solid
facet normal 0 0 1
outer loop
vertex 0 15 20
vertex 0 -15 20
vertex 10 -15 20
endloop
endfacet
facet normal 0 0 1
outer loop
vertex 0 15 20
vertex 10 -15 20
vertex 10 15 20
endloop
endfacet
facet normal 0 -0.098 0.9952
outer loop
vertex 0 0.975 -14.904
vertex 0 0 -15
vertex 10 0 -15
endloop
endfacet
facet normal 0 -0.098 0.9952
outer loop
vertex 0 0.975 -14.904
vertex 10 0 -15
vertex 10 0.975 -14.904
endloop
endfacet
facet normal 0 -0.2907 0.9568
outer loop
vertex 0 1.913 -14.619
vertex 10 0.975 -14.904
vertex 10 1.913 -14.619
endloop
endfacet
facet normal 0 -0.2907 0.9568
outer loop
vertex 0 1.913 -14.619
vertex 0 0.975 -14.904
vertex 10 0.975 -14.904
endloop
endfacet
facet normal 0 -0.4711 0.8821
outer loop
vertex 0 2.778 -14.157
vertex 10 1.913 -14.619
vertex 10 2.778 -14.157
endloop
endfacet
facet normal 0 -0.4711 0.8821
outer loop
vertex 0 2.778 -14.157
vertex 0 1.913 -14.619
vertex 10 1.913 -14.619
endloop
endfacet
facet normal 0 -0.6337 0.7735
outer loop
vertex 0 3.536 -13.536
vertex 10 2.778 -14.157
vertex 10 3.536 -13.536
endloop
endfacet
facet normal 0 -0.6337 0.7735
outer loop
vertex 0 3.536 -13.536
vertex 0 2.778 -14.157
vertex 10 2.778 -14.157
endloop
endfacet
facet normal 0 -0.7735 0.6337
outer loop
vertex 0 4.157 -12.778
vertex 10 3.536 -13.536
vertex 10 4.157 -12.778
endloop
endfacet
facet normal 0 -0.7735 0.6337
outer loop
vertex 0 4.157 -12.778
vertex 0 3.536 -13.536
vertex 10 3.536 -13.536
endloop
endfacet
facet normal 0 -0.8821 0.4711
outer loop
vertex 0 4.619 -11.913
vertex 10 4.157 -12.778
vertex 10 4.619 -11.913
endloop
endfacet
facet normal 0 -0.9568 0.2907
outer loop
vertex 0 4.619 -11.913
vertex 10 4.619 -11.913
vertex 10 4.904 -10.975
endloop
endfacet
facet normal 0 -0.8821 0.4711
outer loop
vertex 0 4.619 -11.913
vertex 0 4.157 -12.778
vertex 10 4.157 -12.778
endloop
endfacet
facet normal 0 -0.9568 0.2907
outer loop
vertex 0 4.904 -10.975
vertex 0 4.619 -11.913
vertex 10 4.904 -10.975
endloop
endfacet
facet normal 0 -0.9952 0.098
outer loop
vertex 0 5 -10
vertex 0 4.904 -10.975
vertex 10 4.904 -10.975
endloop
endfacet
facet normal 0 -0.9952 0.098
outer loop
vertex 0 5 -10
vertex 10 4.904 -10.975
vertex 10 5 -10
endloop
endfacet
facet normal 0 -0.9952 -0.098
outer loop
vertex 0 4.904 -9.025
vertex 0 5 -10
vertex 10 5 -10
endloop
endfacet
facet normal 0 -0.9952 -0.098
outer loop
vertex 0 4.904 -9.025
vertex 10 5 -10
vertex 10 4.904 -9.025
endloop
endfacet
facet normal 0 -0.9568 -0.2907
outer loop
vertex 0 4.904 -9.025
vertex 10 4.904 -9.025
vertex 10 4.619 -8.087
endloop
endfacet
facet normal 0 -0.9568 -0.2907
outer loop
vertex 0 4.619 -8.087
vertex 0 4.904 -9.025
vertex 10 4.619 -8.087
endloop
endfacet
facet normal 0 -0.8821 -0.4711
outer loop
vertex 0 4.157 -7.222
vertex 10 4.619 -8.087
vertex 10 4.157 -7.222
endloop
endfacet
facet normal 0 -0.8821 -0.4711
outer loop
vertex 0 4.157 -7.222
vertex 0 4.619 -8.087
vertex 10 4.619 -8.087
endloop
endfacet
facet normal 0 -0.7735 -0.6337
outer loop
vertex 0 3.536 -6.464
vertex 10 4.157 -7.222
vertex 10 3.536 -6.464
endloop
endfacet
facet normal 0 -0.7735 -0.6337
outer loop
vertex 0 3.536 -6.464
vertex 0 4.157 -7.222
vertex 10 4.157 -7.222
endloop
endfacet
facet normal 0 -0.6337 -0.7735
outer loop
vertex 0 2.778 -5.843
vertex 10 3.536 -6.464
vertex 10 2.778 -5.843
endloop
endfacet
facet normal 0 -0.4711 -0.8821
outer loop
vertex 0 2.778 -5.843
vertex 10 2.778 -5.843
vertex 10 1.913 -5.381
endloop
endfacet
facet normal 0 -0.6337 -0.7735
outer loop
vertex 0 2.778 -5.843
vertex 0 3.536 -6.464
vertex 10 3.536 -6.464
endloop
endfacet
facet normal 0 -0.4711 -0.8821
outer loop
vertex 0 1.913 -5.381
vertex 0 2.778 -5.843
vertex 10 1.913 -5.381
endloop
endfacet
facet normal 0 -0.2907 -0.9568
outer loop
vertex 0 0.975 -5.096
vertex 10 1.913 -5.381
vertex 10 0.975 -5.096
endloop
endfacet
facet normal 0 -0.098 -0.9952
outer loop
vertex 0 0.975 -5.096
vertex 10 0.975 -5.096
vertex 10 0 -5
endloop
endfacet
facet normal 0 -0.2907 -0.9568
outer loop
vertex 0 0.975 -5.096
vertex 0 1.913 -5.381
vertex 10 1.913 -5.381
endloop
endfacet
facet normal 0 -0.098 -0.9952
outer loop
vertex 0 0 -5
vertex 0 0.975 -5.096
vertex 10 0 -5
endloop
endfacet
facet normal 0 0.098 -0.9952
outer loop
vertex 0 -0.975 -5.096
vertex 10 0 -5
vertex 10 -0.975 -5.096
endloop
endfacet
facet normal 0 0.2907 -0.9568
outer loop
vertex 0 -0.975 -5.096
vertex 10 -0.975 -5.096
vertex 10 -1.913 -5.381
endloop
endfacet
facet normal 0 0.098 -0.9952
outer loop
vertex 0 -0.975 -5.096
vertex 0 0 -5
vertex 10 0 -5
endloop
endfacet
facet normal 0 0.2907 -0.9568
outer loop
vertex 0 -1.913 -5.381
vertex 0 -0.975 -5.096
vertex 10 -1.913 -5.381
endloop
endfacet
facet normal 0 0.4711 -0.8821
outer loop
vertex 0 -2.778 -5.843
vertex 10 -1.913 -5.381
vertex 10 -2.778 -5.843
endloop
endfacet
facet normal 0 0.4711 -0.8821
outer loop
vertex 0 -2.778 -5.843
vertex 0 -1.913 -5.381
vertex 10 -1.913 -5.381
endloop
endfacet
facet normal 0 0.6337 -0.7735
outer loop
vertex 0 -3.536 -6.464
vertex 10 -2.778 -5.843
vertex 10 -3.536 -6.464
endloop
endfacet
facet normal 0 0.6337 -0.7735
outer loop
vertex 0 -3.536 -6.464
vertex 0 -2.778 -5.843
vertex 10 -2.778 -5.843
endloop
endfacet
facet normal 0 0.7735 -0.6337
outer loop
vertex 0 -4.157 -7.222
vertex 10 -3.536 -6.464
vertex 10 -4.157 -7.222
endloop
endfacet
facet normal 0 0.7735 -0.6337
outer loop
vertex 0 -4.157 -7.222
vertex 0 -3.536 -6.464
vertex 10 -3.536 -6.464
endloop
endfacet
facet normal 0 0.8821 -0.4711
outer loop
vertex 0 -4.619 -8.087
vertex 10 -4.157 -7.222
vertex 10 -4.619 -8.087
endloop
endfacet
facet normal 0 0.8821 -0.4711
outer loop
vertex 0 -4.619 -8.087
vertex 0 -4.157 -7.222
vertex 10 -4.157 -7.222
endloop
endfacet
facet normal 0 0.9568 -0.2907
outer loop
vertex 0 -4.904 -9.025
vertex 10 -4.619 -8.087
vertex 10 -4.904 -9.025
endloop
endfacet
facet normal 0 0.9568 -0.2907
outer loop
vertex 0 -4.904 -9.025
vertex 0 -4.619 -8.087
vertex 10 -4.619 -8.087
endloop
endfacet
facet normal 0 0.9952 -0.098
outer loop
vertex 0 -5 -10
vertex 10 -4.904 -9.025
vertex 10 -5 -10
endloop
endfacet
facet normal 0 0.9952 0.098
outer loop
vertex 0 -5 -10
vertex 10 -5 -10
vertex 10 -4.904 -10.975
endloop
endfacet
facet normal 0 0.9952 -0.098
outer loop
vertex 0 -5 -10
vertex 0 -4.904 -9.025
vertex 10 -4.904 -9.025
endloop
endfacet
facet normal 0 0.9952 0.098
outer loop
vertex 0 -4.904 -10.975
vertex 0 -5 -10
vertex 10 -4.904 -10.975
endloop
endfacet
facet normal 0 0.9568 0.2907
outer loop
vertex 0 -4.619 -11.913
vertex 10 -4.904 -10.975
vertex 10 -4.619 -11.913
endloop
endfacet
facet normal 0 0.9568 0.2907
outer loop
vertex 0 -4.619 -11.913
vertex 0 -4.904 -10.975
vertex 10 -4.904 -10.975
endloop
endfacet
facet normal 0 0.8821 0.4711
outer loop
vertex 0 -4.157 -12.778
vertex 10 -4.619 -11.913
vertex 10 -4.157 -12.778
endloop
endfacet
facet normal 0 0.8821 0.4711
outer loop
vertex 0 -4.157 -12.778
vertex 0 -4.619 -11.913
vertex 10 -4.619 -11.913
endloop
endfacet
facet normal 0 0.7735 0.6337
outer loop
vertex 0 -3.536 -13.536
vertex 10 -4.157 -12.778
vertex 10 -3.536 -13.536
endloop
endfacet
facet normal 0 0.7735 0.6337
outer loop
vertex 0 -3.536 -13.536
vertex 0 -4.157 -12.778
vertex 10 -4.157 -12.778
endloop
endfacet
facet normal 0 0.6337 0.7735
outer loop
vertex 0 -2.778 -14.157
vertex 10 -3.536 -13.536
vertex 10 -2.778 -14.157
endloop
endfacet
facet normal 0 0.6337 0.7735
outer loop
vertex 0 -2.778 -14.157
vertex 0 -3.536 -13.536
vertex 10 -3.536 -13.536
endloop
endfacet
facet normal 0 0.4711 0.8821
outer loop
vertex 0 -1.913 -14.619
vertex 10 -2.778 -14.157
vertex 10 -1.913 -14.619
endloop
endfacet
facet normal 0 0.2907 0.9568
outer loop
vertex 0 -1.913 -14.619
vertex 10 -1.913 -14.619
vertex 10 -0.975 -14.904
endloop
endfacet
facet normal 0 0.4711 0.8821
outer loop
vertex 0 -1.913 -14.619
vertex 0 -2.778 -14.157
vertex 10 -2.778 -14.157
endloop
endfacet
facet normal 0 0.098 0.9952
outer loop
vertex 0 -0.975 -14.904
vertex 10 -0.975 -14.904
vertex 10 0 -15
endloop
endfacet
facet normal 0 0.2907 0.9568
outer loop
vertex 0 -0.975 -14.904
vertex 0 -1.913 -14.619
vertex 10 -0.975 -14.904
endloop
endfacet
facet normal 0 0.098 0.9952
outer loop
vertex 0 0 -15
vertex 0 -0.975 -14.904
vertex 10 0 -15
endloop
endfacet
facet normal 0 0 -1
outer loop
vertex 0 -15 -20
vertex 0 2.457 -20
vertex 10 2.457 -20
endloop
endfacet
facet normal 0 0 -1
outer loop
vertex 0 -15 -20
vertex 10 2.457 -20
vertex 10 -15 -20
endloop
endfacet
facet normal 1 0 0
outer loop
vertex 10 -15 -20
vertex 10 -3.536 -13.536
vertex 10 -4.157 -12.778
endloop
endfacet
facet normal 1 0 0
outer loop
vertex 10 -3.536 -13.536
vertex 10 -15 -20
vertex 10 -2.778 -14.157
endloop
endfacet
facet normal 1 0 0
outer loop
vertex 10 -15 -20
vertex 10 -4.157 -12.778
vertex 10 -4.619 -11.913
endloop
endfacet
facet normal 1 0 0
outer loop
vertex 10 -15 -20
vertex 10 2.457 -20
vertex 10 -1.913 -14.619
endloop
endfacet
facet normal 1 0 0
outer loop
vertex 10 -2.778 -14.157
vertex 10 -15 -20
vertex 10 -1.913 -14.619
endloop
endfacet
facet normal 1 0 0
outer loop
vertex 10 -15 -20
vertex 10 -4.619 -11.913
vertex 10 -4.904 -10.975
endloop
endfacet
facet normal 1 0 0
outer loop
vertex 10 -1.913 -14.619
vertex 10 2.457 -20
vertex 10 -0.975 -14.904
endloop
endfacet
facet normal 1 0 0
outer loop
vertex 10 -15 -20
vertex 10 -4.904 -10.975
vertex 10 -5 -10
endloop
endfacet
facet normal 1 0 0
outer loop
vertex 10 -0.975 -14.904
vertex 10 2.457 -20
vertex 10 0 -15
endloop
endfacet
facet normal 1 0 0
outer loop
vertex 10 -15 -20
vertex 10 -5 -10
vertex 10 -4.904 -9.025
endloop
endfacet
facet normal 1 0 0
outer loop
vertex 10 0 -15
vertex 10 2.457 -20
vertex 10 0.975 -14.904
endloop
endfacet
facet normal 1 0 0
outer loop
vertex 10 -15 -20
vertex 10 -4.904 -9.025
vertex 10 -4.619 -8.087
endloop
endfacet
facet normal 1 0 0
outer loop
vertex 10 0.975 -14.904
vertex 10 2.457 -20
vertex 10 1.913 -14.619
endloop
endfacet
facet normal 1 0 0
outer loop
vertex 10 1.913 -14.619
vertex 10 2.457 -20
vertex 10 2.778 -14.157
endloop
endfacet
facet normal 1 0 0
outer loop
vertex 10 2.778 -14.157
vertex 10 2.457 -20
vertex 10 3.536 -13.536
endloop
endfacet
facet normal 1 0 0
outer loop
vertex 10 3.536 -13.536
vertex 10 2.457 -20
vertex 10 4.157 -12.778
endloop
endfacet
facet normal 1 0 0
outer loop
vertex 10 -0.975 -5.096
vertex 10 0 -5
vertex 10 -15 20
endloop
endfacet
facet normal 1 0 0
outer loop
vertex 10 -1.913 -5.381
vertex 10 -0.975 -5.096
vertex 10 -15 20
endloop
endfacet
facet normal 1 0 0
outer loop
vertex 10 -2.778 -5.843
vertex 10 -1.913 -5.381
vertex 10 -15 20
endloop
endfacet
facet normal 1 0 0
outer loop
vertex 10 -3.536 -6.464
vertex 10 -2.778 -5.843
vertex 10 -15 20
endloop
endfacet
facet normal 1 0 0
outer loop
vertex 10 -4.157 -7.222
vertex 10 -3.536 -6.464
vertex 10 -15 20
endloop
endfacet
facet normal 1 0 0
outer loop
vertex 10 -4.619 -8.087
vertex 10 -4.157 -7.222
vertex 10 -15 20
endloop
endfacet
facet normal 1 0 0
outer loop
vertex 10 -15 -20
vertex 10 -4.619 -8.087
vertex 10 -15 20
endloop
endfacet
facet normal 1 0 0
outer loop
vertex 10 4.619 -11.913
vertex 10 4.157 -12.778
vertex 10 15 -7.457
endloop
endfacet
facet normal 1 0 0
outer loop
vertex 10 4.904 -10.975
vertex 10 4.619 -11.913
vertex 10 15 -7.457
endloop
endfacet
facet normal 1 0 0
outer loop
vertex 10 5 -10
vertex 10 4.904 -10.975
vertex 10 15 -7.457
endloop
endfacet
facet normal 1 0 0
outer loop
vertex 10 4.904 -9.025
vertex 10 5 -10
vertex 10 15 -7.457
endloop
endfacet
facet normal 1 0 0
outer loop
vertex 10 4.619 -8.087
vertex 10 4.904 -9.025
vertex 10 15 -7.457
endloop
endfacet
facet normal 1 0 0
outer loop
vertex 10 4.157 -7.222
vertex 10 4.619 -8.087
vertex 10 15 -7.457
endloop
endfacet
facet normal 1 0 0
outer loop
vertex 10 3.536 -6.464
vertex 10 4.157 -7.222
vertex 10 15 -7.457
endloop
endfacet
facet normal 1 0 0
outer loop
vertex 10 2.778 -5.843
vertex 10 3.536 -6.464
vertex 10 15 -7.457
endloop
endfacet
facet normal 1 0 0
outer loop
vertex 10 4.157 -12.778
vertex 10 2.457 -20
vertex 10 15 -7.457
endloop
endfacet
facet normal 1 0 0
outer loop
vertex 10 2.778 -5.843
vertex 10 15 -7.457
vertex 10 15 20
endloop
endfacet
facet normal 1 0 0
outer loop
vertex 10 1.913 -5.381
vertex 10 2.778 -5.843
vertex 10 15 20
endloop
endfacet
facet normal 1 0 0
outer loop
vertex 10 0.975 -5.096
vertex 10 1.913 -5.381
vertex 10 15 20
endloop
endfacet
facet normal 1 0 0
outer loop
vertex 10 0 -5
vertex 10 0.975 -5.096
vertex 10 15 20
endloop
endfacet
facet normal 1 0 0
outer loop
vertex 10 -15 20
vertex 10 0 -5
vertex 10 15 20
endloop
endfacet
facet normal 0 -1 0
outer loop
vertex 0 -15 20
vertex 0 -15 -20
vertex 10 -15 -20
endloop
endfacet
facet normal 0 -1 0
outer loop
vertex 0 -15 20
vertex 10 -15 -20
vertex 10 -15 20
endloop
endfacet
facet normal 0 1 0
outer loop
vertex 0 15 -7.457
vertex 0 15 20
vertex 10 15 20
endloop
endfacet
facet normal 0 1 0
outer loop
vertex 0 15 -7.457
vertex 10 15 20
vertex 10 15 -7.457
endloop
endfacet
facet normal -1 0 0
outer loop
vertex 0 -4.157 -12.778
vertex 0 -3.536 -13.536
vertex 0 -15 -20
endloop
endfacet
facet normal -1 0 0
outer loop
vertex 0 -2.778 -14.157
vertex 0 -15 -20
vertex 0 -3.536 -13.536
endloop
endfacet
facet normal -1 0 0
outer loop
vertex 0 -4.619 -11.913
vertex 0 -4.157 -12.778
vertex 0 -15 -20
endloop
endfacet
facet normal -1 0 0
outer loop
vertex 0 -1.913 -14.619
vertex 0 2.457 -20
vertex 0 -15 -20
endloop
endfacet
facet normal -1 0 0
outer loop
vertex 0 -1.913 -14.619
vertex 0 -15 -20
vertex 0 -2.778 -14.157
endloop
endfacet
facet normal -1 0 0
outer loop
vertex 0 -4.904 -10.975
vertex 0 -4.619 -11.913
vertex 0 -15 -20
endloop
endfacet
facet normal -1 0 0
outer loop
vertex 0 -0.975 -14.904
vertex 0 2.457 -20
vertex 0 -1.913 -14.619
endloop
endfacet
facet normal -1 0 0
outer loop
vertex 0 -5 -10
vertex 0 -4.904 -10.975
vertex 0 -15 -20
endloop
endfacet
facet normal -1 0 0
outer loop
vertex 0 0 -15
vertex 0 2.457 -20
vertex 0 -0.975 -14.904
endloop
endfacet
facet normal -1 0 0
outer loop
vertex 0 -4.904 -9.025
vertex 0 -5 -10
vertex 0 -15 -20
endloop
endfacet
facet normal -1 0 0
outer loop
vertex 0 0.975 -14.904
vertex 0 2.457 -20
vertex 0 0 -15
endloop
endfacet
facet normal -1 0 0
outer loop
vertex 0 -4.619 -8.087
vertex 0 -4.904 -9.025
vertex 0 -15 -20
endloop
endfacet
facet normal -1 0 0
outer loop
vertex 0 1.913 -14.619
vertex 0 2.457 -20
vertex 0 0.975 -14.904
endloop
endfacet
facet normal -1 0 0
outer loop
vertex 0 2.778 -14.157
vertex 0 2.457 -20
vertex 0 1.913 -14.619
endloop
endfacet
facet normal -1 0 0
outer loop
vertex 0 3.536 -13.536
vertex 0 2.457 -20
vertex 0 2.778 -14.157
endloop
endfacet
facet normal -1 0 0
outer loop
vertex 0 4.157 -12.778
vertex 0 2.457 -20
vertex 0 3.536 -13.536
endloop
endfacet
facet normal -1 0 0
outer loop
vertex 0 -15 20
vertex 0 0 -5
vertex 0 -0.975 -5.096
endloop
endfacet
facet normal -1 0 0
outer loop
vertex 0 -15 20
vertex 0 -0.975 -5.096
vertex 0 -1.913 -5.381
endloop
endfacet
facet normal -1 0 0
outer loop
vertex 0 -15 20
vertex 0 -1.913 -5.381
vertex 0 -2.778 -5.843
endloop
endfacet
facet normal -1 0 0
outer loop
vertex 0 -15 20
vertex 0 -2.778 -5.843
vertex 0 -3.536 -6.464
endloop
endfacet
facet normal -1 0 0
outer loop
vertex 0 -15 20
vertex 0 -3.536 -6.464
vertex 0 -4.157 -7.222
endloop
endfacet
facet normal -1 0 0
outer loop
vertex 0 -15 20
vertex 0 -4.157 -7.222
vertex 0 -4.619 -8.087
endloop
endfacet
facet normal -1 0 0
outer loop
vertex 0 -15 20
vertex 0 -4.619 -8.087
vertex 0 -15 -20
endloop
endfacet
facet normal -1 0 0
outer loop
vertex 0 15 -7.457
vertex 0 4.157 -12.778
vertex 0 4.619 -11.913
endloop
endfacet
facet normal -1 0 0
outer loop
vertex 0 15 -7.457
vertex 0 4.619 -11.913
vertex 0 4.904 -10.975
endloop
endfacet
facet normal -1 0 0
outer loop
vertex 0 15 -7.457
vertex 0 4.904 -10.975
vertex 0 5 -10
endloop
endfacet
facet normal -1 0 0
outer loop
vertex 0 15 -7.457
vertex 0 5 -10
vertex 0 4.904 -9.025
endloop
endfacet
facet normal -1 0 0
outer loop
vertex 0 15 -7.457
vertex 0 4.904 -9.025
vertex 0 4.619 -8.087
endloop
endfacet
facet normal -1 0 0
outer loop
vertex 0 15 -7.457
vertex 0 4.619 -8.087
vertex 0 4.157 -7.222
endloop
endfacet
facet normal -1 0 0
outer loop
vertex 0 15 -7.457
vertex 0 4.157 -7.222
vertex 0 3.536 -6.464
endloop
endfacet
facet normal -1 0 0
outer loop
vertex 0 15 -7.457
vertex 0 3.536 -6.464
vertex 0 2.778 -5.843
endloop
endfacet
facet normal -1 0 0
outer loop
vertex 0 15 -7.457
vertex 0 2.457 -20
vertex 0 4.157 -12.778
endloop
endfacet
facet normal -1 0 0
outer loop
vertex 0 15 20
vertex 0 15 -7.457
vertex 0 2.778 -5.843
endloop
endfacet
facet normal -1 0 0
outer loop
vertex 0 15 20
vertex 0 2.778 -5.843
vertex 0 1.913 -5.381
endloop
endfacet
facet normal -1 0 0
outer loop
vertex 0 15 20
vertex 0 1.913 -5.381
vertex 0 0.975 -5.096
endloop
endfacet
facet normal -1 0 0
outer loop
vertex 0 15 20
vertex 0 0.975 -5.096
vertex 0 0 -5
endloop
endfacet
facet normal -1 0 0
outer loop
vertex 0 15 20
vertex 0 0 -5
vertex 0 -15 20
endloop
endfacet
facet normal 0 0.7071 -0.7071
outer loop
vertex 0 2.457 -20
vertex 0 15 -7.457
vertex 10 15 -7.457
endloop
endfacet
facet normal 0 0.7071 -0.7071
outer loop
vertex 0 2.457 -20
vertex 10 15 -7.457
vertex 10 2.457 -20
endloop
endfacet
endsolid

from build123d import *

# Parameters (mm, degrees)
SZKIC1_R                    = 5
DODANIE_WYCI_GNI_CIE1_DEPTH = 10


with BuildPart() as part:
    # Szkic1 → Dodanie-wyciągnięcie1 (new body)
    with BuildSketch(Plane(origin=(0, 0, 0), x_dir=(0, 0, -1), z_dir=(1, 0, 0))):
        Polygon((7.45669071, 15), (20, 2.45669071), (20, -15), (-20, -15), (-20, 15), align=None)
        with Locations((10, 0)):
            Circle(SZKIC1_R, mode=Mode.SUBTRACT)
    extrude(amount=DODANIE_WYCI_GNI_CIE1_DEPTH)


solid = part.part
